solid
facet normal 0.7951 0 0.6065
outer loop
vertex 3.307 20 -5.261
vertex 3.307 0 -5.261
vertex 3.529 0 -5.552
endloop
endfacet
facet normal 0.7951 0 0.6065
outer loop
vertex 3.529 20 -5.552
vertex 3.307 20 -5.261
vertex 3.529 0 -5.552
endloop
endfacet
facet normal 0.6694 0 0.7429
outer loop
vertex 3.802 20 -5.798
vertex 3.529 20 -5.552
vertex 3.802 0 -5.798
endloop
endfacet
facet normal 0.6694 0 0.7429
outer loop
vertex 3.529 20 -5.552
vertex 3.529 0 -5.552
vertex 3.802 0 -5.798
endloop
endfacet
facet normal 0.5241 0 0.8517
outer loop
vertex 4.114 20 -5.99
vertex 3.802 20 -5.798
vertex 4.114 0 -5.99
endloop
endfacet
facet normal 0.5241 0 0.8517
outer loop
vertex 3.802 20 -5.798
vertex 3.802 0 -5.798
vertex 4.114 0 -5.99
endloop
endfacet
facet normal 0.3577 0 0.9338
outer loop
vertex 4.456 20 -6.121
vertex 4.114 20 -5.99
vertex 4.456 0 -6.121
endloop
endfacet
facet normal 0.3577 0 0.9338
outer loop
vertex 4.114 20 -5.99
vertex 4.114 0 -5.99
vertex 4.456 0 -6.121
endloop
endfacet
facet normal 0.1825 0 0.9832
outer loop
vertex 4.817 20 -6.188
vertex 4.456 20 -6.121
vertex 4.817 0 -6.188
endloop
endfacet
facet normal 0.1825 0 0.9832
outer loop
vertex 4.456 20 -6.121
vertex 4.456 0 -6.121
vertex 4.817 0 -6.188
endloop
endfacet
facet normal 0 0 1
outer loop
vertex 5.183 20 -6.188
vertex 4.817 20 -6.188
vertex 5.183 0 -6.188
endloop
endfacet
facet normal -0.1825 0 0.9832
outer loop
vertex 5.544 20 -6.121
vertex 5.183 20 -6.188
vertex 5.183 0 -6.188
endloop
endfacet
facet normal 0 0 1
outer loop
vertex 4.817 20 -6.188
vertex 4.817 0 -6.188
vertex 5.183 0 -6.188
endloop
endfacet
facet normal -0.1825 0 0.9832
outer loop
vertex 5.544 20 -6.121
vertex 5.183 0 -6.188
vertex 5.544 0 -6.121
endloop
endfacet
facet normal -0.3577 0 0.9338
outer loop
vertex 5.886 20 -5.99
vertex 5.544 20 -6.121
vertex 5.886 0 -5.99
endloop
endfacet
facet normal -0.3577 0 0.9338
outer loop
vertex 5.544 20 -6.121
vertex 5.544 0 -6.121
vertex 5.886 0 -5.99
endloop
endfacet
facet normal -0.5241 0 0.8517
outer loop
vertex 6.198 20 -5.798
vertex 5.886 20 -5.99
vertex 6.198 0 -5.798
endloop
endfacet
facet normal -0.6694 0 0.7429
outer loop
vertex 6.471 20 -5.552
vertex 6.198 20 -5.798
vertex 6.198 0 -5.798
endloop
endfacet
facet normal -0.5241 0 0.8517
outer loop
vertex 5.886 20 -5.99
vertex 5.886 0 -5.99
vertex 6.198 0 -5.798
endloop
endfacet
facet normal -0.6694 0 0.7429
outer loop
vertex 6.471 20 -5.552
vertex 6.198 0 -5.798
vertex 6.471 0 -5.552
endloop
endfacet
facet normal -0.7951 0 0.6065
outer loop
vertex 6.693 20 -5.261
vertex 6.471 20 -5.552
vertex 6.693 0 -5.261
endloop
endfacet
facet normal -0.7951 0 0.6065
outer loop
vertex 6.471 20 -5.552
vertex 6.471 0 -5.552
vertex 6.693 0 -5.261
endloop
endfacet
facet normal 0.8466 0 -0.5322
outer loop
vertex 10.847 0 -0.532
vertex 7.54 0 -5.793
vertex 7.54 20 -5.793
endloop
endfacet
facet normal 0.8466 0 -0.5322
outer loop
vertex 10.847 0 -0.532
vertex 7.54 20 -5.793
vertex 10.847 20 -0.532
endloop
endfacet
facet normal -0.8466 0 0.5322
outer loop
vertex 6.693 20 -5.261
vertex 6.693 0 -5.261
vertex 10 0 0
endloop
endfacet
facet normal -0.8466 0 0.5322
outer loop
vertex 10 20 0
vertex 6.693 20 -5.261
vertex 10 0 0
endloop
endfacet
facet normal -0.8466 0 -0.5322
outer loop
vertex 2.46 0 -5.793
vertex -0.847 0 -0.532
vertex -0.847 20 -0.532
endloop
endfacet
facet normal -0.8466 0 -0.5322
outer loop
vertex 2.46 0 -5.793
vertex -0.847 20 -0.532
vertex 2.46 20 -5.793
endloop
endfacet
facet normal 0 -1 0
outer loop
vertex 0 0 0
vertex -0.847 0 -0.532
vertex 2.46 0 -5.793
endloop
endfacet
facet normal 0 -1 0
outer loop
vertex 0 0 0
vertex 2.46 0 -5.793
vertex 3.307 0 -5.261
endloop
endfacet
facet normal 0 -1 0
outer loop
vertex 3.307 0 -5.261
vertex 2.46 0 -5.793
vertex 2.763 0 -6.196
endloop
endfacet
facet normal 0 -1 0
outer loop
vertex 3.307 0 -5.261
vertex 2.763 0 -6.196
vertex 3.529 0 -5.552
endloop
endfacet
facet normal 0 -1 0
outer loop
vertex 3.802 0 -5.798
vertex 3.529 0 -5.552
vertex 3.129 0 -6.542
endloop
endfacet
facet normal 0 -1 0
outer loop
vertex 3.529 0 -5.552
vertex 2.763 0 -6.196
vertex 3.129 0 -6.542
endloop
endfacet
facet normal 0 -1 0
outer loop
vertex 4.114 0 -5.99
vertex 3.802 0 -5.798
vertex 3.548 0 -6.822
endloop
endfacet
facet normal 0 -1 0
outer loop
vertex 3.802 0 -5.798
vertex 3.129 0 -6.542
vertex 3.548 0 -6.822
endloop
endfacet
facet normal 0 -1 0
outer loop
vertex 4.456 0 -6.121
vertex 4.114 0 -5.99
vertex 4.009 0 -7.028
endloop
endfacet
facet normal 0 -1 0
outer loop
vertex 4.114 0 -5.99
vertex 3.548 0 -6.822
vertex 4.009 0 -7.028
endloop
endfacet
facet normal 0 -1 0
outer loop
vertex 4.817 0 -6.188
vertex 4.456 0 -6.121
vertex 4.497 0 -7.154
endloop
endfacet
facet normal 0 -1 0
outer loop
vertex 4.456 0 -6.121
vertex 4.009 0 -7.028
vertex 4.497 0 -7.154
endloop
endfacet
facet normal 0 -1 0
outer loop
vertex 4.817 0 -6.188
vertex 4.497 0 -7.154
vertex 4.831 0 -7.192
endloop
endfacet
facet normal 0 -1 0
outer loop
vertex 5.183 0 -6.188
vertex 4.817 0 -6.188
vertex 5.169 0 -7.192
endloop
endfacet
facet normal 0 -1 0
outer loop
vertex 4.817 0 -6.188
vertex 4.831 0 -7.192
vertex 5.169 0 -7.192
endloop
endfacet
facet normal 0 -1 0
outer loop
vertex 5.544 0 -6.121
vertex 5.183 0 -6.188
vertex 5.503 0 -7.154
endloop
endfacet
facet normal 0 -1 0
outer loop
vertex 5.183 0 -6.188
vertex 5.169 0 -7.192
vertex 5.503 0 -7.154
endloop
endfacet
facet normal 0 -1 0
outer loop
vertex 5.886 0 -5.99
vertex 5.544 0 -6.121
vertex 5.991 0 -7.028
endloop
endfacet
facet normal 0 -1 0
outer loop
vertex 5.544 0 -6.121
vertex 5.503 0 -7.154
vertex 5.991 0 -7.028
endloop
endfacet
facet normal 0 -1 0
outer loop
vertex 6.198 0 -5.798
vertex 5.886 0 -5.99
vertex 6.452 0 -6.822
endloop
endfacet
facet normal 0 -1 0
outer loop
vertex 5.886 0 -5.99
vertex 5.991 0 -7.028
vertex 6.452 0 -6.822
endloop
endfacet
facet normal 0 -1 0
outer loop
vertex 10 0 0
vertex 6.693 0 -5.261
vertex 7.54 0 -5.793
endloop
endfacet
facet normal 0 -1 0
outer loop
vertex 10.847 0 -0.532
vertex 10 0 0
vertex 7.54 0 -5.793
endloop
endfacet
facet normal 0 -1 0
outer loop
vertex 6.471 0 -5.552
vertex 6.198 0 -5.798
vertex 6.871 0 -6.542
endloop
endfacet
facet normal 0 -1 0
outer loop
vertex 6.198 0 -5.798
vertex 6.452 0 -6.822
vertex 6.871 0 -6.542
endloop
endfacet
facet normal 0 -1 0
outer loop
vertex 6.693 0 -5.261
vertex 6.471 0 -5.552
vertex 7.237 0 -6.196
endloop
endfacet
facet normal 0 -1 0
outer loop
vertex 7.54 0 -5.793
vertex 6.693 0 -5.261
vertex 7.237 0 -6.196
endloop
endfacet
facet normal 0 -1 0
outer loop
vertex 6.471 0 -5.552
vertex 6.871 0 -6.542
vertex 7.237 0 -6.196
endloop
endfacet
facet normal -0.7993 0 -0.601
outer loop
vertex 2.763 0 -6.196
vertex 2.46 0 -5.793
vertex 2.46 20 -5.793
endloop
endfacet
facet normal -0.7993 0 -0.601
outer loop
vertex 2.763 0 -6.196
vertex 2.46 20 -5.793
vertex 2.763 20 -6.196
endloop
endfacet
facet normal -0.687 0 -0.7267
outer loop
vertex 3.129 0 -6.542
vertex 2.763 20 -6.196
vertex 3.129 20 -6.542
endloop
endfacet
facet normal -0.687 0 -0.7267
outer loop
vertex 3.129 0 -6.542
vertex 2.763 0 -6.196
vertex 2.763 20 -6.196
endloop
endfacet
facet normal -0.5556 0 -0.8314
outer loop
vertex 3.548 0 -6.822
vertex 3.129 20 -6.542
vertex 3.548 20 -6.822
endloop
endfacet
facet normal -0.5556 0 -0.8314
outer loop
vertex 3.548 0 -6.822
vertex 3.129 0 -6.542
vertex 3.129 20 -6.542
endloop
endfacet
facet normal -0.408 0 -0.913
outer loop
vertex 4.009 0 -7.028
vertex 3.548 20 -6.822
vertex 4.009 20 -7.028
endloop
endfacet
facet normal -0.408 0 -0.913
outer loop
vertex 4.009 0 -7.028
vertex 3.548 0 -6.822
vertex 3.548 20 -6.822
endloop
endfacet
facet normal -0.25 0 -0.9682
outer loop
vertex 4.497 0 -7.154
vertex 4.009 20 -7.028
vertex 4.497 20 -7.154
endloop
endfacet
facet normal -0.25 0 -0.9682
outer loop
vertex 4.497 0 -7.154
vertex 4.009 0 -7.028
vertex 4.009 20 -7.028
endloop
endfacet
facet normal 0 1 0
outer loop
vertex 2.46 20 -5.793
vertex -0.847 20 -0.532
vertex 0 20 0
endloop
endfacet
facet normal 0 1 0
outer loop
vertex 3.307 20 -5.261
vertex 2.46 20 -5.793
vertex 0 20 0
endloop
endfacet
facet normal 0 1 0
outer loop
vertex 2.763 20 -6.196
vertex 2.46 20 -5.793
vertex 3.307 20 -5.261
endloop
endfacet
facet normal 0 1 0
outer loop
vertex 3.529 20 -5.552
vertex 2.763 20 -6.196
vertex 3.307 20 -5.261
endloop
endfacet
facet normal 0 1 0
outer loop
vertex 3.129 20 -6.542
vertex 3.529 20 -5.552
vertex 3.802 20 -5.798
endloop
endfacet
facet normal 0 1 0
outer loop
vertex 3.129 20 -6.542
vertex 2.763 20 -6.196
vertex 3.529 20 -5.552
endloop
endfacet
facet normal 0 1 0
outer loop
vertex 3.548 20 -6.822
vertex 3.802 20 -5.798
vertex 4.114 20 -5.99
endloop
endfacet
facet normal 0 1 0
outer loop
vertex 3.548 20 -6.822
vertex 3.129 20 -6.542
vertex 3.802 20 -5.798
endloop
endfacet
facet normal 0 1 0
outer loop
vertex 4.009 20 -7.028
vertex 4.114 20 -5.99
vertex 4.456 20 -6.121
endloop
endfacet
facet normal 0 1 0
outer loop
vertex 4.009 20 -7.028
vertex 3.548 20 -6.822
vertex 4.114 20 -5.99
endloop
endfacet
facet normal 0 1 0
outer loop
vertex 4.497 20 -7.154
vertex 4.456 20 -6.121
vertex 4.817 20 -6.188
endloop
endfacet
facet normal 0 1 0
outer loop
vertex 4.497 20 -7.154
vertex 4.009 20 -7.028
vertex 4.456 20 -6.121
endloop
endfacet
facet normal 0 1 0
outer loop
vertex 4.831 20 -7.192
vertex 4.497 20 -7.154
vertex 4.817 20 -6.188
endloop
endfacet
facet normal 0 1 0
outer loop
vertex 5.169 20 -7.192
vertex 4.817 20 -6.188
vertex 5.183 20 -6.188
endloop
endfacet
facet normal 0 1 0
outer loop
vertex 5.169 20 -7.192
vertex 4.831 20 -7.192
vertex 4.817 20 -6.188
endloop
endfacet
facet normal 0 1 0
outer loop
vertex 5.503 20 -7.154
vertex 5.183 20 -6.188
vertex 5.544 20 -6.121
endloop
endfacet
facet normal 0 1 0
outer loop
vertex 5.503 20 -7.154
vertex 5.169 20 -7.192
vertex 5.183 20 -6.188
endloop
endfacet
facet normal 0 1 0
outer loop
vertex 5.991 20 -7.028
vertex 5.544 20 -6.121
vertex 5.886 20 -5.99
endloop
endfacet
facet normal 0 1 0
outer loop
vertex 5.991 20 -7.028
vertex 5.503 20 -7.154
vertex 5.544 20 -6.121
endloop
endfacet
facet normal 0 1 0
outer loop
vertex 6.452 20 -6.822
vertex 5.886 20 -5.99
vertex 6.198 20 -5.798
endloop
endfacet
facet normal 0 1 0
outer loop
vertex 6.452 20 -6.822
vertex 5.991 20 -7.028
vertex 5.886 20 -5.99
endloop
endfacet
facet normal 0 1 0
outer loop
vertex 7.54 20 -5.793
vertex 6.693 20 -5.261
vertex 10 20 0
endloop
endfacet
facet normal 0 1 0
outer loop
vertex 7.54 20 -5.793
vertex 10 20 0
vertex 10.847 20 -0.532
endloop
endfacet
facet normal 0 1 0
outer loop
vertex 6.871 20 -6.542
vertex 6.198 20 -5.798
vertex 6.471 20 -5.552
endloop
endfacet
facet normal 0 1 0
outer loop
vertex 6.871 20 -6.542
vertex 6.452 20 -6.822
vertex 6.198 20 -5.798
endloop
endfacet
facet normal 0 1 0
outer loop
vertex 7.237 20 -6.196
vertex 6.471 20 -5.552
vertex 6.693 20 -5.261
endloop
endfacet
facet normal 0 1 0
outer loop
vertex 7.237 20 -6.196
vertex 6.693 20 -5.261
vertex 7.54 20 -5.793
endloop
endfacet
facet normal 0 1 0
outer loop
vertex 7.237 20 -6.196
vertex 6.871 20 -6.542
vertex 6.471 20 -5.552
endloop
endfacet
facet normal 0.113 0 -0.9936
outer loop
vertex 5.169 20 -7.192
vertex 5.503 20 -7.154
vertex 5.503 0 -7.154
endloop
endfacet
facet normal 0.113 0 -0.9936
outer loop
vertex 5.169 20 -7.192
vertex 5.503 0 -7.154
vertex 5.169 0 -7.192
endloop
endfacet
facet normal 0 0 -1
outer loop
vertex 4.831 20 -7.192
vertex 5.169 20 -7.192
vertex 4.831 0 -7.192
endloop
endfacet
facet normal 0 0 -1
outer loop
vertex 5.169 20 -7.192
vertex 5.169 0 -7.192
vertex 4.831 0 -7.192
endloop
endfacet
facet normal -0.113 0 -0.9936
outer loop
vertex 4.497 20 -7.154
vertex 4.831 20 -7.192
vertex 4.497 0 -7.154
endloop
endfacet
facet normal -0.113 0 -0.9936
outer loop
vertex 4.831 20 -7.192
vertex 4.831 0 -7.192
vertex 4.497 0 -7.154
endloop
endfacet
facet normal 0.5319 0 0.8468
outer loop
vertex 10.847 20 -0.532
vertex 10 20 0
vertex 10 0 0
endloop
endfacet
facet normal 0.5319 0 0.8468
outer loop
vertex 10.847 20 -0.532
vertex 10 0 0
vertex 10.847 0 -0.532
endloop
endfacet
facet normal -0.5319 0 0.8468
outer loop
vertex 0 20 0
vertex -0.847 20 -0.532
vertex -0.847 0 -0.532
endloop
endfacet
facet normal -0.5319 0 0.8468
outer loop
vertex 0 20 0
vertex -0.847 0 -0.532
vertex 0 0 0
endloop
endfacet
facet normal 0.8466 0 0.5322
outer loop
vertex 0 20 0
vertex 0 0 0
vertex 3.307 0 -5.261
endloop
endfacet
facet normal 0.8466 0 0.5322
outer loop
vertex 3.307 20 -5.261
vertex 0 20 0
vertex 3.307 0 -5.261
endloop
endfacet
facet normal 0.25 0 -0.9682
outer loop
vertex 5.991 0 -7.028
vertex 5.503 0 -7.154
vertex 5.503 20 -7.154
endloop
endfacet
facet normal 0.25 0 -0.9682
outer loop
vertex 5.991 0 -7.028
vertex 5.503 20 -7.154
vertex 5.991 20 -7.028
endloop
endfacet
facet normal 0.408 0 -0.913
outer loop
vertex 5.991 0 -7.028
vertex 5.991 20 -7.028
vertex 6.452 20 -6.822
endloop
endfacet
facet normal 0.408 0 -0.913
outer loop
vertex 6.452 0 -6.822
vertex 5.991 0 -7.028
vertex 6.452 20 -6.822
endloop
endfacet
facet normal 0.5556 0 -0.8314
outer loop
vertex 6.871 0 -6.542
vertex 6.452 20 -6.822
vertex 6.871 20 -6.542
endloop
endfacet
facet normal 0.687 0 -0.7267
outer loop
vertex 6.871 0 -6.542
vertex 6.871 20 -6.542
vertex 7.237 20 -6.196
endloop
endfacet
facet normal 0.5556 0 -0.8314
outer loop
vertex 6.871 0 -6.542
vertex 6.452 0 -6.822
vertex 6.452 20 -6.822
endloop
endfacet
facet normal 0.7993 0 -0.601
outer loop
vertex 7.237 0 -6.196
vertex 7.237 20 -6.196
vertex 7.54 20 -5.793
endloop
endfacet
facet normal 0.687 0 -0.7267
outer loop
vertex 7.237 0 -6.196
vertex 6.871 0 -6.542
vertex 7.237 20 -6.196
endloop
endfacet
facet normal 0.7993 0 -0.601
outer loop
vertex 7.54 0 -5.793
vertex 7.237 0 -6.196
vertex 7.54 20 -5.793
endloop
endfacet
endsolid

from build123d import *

# Parameters (mm, degrees)
BOSS_EXTRUDE1_DEPTH    = 20
CONVERT_SOLID1_DEPTH   = 20
CONVERT_SOLID1_2_DEPTH = 20


# Read off the part's stored shape, not the designer's step: Convert-Solid1
with BuildPart() as part:
    # Sketch1 → Boss-Extrude1 (new body)
    with BuildSketch(Plane(origin=(0, 0, 0), x_dir=(1, 0, 0), z_dir=(0, 1, 0))):
        Polygon((0, 0), (5, 7.955252718), (10, 0), (11.693315732, 1.064275261), (5, 11.713678895), (-1.693315732, 1.064275261), align=None)
    extrude(amount=BOSS_EXTRUDE1_DEPTH)

    # Convert-Solid1 outline → Convert-Solid1 (cut)
    with BuildSketch(Plane(origin=(0, 0, 0), x_dir=(1, 0, 0), z_dir=(0, 1, 0))):
        with BuildLine():
            Line((5, 7.955252718), (5.503419817, 7.154286344))
            ThreePointArc((5.503419817, 7.154286344), (6.666935225, 6.69108534), (7.539973598, 5.793239432))
            Line((7.539973598, 5.793239432), (10.846657866, 0.53213763))
            Line((10.846657866, 0.53213763), (11.693315732, 1.064275261))
            Line((11.693315732, 1.064275261), (5, 11.713678895))
            Line((5, 11.713678895), (-1.693315732, 1.064275261))
            Line((-1.693315732, 1.064275261), (-0.846657866, 0.53213763))
            Line((-0.846657866, 0.53213763), (2.460026402, 5.793239432))
            ThreePointArc((2.460026402, 5.793239432), (3.333064775, 6.69108534), (4.496580183, 7.154286344))
            Line((4.496580183, 7.154286344), (5, 7.955252718))
        make_face()
    extrude(amount=CONVERT_SOLID1_DEPTH, mode=Mode.SUBTRACT)

    # Convert-Solid1 2 outline → Convert-Solid1 2 (add)
    with BuildSketch(Plane(origin=(0, 0, 0), x_dir=(1, 0, 0), z_dir=(0, 1, 0))):
        with BuildLine():
            ThreePointArc((3.306684268, 5.261101802), (5, 6.196826541), (6.693315732, 5.261101802))
            Line((6.693315732, 5.261101802), (5.503419817, 7.154286344))
            ThreePointArc((5.503419817, 7.154286344), (5, 7.196826541), (4.496580183, 7.154286344))
            Line((4.496580183, 7.154286344), (3.306684268, 5.261101802))
        make_face()
    extrude(amount=CONVERT_SOLID1_2_DEPTH)


solid = part.part
